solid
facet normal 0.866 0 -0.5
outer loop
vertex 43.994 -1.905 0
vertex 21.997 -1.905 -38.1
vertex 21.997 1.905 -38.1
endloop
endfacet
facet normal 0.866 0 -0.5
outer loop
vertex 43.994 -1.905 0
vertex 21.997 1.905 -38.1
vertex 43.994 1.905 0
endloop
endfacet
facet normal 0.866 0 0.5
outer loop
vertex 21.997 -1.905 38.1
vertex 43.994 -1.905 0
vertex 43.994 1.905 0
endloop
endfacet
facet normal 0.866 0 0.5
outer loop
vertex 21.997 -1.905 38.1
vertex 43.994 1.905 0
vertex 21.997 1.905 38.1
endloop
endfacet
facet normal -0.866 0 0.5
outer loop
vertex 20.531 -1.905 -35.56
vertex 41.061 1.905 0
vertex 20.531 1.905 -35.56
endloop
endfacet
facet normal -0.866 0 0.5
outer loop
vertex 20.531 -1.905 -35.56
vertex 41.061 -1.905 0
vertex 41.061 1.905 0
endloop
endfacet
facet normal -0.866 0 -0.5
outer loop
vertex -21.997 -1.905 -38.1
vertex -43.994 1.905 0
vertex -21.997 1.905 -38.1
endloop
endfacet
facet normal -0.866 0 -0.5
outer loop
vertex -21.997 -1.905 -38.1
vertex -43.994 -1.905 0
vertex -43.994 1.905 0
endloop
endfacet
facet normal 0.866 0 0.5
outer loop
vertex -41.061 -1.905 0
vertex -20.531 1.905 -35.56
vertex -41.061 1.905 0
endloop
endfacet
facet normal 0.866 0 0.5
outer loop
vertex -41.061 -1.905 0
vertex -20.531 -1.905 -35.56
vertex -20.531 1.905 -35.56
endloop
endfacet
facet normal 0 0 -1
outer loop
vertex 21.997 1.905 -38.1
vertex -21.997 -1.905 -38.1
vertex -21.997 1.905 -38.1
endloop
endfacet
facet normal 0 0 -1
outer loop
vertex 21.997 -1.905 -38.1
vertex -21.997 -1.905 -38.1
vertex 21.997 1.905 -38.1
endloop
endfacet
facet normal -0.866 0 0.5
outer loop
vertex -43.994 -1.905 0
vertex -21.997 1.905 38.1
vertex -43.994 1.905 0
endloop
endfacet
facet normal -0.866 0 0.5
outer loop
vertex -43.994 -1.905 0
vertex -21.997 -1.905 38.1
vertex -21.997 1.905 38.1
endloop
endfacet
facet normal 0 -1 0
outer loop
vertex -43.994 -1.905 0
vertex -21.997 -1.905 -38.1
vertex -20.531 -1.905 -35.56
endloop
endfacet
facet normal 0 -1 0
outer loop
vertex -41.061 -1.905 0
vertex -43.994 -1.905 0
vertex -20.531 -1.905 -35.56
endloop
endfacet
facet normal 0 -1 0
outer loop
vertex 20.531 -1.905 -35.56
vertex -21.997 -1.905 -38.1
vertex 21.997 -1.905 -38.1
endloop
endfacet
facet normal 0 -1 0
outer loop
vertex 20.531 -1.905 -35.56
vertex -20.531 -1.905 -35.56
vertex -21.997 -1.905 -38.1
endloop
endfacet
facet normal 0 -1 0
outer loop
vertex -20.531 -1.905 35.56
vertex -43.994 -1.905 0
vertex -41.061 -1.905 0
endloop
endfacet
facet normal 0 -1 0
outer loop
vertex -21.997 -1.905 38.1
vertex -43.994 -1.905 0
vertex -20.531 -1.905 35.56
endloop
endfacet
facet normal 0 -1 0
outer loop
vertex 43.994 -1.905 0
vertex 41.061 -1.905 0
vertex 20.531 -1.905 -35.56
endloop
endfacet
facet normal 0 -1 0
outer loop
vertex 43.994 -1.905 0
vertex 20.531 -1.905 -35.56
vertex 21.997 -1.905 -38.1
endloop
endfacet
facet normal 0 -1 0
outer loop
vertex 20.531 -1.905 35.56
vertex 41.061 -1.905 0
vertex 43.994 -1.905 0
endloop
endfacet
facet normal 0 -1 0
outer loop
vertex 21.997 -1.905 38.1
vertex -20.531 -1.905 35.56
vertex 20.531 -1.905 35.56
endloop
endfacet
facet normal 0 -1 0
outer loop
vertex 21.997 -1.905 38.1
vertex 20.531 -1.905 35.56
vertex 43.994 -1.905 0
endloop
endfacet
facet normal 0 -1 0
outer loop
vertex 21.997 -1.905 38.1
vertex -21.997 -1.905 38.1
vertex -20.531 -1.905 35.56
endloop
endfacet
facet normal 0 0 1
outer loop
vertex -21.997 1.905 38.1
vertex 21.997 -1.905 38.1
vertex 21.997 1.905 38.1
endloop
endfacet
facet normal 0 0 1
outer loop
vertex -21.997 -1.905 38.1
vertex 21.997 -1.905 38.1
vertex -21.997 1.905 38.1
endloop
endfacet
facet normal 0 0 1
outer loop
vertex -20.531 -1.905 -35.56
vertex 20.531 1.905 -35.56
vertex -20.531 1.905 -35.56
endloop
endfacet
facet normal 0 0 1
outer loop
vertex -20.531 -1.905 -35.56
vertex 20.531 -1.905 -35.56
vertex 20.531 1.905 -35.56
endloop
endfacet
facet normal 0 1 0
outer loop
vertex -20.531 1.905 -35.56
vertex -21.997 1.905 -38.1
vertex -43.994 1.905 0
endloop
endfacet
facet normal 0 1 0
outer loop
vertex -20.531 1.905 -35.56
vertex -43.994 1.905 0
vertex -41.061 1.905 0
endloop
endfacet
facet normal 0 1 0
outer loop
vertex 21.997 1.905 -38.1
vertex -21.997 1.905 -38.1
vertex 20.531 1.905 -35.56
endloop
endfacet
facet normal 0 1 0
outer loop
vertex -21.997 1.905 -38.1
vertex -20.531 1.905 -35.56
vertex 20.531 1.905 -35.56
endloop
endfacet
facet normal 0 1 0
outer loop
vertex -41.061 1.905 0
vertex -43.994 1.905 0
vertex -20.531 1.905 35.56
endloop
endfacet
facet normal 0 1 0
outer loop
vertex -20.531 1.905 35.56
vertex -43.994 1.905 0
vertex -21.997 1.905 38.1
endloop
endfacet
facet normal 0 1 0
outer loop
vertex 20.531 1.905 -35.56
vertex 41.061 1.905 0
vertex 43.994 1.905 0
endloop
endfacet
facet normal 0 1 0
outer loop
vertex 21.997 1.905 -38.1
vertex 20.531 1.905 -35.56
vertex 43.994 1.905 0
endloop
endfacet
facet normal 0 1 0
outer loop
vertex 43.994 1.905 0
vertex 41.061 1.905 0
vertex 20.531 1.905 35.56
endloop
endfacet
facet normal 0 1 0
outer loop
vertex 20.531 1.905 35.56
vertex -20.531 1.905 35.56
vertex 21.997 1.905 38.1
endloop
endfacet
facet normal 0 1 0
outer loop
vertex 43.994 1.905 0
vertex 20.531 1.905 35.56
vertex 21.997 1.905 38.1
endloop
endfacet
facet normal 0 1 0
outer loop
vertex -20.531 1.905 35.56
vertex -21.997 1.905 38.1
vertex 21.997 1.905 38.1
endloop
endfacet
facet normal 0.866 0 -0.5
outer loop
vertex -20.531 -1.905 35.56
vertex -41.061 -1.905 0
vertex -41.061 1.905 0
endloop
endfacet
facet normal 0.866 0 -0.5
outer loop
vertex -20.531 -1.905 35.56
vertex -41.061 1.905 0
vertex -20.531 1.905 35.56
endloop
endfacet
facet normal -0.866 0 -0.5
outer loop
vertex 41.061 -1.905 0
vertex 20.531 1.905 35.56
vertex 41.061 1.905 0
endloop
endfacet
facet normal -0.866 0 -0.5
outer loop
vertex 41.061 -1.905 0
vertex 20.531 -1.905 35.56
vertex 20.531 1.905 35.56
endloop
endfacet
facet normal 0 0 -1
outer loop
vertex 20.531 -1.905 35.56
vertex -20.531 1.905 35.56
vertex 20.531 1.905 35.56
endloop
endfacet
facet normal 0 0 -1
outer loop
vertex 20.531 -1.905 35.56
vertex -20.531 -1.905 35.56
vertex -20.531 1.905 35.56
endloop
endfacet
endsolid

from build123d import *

# Parameters (mm, degrees)
F1_DEPTH = 1.905


with BuildPart() as f1:
    # F0 (on Front) → F1 (new body, symmetric)
    with BuildSketch(Plane.XZ):
        Polygon((-21.997045, -38.1), (21.997045, -38.1), (43.994091, 0), (21.997045, 38.1), (-21.997045, 38.1), (-43.994091, 0), align=None)
        Polygon((-41.061151, 0), (-20.530576, 35.56), (20.530576, 35.56), (41.061151, 0), (20.530576, -35.56), (-20.530576, -35.56), align=None, mode=Mode.SUBTRACT)
    extrude(amount=F1_DEPTH, both=True)


solid = f1.part
